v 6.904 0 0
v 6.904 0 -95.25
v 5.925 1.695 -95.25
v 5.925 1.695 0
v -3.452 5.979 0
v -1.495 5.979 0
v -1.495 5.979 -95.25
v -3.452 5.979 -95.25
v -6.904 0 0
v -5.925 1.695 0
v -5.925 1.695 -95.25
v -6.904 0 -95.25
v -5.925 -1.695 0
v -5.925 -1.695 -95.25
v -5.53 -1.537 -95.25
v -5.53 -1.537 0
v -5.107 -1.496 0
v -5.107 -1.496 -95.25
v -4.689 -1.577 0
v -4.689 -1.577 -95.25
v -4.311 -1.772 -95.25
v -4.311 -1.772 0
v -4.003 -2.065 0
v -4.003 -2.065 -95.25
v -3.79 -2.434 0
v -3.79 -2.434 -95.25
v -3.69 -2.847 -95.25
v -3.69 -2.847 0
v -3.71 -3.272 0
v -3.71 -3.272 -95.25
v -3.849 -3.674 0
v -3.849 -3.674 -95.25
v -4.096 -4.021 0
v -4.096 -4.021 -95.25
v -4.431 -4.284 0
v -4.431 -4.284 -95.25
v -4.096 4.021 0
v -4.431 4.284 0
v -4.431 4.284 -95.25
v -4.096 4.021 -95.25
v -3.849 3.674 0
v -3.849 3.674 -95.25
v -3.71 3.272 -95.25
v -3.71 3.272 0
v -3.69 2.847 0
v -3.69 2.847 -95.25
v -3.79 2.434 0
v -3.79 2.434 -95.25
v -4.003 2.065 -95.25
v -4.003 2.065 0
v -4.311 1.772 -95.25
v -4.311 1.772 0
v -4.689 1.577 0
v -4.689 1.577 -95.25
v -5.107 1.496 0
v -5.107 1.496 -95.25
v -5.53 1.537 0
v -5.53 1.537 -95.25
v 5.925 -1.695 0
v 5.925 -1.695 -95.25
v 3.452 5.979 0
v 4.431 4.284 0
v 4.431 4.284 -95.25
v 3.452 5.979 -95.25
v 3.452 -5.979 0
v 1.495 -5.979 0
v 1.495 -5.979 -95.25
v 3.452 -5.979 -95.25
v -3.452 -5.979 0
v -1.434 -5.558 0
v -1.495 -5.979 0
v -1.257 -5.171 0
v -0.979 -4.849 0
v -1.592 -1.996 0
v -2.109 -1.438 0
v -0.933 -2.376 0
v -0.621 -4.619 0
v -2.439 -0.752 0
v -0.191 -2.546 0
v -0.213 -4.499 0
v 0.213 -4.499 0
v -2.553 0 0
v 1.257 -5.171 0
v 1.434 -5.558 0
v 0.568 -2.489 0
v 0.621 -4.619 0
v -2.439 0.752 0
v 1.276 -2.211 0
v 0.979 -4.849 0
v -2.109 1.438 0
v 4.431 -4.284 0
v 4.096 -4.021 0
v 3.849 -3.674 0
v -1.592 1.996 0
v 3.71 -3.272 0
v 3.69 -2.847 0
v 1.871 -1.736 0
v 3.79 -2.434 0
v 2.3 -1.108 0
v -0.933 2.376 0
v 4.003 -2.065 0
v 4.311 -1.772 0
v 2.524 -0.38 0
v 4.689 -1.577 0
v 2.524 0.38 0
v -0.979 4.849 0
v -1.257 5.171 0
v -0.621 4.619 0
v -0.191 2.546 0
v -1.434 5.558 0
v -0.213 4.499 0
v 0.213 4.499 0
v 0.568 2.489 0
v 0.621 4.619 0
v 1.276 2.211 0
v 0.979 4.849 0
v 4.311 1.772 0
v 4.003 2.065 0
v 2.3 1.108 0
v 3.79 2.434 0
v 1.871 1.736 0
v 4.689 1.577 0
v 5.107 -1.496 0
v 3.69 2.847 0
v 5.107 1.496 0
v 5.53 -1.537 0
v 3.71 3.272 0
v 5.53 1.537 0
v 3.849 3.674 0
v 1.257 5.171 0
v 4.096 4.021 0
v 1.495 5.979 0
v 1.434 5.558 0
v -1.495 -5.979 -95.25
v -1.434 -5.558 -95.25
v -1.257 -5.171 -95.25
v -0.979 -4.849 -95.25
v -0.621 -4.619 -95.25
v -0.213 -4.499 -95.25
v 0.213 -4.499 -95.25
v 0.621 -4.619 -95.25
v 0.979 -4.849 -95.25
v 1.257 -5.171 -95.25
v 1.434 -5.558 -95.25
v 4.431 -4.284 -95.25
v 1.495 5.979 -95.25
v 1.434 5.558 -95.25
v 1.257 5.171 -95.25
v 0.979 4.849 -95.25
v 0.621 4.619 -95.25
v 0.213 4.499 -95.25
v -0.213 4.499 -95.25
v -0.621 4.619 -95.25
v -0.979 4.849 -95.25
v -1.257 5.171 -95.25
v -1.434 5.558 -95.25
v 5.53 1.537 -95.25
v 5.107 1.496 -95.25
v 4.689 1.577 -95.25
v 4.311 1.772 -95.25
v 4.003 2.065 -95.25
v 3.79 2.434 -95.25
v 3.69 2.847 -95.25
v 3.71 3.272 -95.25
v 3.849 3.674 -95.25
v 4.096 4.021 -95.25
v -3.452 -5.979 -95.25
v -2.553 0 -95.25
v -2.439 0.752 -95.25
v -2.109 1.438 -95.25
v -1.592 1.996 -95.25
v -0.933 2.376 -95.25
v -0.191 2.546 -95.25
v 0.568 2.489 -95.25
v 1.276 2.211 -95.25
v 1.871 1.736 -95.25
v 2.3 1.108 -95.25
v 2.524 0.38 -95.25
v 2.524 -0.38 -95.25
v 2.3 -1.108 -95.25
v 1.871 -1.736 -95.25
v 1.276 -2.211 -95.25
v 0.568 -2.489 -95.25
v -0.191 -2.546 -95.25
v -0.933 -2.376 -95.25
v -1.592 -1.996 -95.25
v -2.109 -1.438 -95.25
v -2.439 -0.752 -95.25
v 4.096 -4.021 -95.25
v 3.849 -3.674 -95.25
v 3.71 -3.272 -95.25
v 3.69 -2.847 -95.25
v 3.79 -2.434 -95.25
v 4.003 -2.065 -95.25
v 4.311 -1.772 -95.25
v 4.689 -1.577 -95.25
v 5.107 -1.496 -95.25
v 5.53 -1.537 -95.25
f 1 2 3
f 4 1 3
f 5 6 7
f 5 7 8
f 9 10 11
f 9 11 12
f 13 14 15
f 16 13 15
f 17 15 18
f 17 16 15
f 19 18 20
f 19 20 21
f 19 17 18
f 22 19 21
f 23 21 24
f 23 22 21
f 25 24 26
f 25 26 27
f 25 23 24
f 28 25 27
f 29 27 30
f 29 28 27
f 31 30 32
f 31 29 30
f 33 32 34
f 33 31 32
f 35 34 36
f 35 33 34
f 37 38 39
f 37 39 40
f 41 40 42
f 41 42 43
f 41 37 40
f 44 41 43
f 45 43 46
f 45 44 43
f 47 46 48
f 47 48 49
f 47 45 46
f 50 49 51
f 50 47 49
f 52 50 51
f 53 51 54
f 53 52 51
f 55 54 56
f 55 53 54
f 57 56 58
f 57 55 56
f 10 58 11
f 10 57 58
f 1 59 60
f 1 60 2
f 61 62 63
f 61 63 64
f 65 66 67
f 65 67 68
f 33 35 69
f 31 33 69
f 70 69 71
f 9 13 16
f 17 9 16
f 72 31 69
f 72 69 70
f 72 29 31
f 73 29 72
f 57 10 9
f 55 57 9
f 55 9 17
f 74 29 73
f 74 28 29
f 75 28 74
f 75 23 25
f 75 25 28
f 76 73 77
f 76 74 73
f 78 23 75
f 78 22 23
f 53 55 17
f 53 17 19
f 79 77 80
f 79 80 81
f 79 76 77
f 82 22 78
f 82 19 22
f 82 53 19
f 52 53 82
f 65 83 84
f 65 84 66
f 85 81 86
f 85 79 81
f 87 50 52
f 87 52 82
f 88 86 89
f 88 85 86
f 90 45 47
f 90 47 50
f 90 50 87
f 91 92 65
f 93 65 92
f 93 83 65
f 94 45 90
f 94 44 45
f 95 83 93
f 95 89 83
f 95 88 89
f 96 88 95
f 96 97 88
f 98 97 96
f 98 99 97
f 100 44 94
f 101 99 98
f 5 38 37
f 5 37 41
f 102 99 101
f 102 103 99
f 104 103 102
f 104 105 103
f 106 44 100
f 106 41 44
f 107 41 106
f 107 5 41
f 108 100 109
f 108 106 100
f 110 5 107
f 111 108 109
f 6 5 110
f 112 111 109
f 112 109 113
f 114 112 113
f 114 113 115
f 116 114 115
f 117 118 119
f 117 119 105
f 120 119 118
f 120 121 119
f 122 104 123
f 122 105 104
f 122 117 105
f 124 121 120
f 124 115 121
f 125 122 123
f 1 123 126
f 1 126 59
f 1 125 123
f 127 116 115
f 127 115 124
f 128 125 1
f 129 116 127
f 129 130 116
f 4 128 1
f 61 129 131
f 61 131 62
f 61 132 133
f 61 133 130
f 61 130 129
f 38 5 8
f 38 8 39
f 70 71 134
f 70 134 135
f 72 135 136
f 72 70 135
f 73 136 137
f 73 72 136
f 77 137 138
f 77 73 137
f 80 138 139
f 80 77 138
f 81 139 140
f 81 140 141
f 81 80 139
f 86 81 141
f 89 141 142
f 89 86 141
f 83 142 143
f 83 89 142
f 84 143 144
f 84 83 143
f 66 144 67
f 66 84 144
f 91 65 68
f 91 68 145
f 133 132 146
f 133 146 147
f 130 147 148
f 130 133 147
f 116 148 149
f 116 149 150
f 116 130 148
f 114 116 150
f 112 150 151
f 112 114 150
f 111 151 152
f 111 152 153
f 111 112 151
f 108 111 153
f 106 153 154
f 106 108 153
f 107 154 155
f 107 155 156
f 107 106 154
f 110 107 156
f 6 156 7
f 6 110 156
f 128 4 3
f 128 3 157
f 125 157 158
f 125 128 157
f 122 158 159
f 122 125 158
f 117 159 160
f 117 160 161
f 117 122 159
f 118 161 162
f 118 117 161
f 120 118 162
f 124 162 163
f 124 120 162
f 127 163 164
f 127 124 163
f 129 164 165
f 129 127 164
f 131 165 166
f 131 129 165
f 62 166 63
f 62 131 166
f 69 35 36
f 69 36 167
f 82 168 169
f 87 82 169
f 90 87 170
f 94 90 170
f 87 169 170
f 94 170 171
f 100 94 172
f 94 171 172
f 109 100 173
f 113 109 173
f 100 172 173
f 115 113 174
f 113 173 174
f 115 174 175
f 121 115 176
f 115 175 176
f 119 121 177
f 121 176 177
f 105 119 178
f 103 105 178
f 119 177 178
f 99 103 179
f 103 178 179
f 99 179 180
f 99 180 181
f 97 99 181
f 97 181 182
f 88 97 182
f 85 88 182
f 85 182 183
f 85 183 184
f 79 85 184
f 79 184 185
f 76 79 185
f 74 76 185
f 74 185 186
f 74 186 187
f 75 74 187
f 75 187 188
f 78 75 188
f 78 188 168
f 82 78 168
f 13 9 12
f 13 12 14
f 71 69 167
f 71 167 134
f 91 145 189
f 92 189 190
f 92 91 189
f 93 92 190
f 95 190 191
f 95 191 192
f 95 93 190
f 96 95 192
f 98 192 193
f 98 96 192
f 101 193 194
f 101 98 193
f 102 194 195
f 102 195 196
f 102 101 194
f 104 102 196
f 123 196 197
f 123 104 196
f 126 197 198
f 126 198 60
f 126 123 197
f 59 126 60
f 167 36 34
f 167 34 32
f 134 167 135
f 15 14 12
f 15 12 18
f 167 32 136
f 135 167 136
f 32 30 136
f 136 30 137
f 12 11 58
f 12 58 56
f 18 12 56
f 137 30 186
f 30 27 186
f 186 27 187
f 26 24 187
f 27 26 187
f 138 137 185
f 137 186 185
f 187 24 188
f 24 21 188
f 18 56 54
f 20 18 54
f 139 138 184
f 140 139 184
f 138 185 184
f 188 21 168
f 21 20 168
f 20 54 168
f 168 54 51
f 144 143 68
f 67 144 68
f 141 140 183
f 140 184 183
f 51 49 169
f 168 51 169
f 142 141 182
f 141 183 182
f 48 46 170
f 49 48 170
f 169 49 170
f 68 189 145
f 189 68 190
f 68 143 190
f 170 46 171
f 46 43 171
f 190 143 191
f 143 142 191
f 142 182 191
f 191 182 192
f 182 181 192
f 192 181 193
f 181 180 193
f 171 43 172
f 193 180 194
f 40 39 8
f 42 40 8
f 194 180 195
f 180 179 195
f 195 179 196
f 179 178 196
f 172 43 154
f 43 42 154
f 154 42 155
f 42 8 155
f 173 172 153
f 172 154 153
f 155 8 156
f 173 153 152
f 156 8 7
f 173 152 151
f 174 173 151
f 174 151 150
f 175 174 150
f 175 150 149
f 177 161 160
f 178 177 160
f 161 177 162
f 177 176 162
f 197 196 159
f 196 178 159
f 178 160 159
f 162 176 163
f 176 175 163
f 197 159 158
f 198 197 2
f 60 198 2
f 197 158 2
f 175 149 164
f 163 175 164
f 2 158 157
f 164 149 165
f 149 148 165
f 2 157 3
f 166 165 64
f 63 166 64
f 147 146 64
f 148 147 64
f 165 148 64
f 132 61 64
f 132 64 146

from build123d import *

# Parameters (mm, degrees)
SKETCH1_R               = 1.5875
BOSS_EXTRUDE1_DEPTH     = 95.25
F_1_4_20_TAPPED_HOLE2_D = 5.1054


with BuildPart() as part:
    # Sketch1 → Boss-Extrude1 (new body)
    with BuildSketch(Plane.XY):
        with BuildLine():
            Line((-4.430514159, -4.283916762), (-3.451917569, -5.978896013))
            Line((-3.451917569, -5.978896013), (-1.49472801, -5.978896013))
            ThreePointArc((-1.49472801, -5.978896013), (-3.62e-07, -4.484168365), (1.49472801, -5.978896013))
            Line((1.49472801, -5.978896013), (3.451916913, -5.978896013))
            Line((3.451916913, -5.978896013), (4.430513537, -4.28391694))
            ThreePointArc((4.430513537, -4.28391694), (3.883406572, -2.242085948), (5.925237563, -1.694978983))
            Line((5.925237563, -1.694978983), (6.903834188, 9.1e-08))
            Line((6.903834188, 9.1e-08), (5.925237797, 1.694979115))
            ThreePointArc((5.925237797, 1.694979115), (3.883406856, 2.242086266), (4.430514007, 4.283917207))
            Line((4.430514007, 4.283917207), (3.451917569, 5.978896313))
            Line((3.451917569, 5.978896313), (1.494720042, 5.978896313))
            ThreePointArc((1.494720042, 5.978896313), (3.62e-07, 4.484176634), (-1.494720042, 5.978896313))
            Line((-1.494720042, 5.978896313), (-3.451916913, 5.978896313))
            Line((-3.451916913, 5.978896313), (-4.43051364, 4.283917299))
            ThreePointArc((-4.43051364, 4.283917299), (-3.883406799, 2.242086274), (-5.925237823, 1.694979433))
            Line((-5.925237823, 1.694979433), (-6.90383455, 4.18e-07))
            Line((-6.90383455, 4.18e-07), (-5.925238028, -1.694978715))
            ThreePointArc((-5.925238028, -1.694978715), (-3.88340707, -2.242085804), (-4.430514159, -4.283916762))
        make_face()
        Circle(SKETCH1_R, mode=Mode.SUBTRACT)
    extrude(amount=-BOSS_EXTRUDE1_DEPTH)

    # 1/4-20 Tapped Hole2 (through all)
    with Locations(Plane.XY):
        with Locations((0, 0)):
            Hole(F_1_4_20_TAPPED_HOLE2_D / 2)


solid = part.part
